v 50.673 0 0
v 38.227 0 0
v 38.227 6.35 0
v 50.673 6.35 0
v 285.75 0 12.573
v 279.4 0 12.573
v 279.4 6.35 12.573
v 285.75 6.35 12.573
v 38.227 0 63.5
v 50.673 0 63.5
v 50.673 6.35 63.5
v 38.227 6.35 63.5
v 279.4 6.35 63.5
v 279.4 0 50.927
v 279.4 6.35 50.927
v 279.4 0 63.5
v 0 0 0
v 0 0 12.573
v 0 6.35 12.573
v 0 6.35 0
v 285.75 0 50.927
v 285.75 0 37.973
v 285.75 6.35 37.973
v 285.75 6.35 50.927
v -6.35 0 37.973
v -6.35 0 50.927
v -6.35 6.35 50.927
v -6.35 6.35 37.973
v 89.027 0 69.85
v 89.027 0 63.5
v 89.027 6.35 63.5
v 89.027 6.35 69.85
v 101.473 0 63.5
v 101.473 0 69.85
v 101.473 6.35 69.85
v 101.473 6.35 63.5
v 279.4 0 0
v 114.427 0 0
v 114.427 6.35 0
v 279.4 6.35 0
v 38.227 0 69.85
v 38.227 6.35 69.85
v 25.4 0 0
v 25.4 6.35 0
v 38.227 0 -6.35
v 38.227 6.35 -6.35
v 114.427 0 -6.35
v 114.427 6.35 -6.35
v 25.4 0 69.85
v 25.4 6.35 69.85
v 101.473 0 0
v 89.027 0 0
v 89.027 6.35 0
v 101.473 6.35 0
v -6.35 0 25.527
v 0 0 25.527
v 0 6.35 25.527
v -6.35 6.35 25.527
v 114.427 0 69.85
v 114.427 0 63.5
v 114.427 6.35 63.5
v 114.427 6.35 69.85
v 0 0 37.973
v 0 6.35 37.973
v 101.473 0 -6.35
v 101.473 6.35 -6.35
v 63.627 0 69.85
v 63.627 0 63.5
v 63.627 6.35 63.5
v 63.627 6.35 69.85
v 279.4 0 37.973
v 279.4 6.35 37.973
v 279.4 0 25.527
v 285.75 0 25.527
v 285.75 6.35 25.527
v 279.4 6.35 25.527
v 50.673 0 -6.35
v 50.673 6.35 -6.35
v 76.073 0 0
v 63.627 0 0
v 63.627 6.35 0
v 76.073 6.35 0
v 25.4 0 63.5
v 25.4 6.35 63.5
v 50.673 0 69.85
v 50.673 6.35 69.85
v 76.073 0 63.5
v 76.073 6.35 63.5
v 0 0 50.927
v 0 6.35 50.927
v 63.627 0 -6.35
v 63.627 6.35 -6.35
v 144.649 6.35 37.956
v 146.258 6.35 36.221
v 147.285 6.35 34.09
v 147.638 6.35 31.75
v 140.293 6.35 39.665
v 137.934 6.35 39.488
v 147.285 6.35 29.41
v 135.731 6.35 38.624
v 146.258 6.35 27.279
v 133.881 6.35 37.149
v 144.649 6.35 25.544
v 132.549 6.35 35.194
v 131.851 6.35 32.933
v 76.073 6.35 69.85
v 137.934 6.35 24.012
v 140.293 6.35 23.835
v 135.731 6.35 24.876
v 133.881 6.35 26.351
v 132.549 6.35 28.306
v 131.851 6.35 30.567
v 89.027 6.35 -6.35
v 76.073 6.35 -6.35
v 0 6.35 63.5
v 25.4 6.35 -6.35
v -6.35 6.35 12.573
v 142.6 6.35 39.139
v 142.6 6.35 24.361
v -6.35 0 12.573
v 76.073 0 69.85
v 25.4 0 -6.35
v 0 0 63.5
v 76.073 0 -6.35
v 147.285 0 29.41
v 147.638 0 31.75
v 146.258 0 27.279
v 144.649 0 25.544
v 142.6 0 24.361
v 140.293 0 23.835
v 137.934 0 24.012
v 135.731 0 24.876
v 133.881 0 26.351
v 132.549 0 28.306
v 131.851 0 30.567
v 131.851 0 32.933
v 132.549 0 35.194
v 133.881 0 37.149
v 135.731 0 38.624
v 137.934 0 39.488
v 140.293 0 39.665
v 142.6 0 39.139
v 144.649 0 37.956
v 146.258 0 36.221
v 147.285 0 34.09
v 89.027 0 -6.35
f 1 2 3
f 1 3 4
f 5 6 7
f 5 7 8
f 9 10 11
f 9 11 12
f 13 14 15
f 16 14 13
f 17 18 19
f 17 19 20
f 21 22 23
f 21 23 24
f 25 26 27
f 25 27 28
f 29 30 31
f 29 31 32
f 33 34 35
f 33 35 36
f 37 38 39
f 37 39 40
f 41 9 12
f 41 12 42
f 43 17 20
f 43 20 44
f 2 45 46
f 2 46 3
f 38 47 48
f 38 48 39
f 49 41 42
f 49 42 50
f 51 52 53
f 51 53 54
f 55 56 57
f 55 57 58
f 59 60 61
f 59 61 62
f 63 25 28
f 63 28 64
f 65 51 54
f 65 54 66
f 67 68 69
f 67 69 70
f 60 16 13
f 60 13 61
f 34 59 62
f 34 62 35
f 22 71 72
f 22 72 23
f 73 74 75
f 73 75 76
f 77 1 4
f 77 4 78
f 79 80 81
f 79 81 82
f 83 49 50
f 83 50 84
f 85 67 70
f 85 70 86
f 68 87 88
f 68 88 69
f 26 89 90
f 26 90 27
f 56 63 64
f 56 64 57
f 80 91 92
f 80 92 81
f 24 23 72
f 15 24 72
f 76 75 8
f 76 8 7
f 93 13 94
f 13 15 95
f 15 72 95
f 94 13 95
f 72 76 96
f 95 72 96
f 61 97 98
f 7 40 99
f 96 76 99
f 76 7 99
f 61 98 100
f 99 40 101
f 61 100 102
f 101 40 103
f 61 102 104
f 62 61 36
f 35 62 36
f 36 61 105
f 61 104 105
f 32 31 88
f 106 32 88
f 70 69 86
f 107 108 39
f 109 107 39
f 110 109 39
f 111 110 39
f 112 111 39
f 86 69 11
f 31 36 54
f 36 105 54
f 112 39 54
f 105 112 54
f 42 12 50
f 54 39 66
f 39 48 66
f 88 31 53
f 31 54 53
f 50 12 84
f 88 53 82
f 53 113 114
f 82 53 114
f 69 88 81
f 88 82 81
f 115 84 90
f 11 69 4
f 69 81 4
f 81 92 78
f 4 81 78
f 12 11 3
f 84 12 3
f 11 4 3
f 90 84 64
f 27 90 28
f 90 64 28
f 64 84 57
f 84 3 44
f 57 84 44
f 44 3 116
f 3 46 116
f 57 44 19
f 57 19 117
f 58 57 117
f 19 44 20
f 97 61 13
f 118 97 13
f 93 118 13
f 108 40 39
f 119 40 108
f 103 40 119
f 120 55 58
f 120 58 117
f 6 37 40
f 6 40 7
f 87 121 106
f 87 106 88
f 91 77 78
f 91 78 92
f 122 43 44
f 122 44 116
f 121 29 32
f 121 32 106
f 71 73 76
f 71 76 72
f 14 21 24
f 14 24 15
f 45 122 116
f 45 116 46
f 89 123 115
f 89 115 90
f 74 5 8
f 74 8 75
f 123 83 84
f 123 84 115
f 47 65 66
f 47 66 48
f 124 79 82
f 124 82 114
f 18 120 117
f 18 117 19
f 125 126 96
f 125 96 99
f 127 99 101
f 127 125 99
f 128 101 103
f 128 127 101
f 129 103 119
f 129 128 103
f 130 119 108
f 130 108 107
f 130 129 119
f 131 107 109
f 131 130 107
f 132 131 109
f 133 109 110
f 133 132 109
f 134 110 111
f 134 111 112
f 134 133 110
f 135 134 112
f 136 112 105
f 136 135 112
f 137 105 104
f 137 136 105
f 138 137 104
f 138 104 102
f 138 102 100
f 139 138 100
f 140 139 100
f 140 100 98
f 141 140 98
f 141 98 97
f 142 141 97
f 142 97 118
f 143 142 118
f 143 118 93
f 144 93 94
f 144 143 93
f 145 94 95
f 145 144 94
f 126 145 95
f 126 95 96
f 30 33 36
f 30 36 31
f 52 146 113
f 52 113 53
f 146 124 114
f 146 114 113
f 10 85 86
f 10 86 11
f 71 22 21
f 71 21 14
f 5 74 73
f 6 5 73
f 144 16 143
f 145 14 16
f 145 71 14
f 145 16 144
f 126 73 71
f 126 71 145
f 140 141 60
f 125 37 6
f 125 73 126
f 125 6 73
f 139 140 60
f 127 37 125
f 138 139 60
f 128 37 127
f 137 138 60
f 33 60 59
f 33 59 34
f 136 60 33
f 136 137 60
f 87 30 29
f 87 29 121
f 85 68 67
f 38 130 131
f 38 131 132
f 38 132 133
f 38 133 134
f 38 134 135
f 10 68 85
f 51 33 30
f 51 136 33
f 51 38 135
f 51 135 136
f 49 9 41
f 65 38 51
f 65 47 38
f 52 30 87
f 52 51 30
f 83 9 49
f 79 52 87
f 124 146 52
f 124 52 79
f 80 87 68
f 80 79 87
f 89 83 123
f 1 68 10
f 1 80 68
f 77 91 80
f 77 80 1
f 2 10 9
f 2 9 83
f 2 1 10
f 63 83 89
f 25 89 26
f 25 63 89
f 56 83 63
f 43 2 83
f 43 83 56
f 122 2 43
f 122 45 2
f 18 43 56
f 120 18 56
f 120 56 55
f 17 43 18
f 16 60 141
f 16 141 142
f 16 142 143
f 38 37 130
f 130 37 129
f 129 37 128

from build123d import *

# Parameters (mm, degrees)
SKETCH1_R           = 7.9375
BOSS_EXTRUDE1_DEPTH = 6.35


with BuildPart() as part:
    # Sketch1 → Boss-Extrude1 (new body)
    with BuildSketch(Plane(origin=(0, 0, 0), x_dir=(1, 0, 0), z_dir=(0, 1, 0))):
        Polygon((279.4, 0), (279.4, -12.573), (285.75, -12.573), (285.75, -25.527), (279.4, -25.527), (279.4, -37.973), (285.75, -37.973), (285.75, -50.927), (279.4, -50.927), (279.4, -63.5), (114.427, -63.5), (114.427, -69.85), (101.473, -69.85), (101.473, -63.5), (89.027, -63.5), (89.027, -69.85), (76.073, -69.85), (76.073, -63.5), (63.627, -63.5), (63.627, -69.85), (50.673, -69.85), (50.673, -63.5), (38.227, -63.5), (38.227, -69.85), (25.4, -69.85), (25.4, -63.5), (0, -63.5), (0, -50.927), (-6.35, -50.927), (-6.35, -37.973), (0, -37.973), (0, -25.527), (-6.35, -25.527), (-6.35, -12.573), (0, -12.573), (0, 0), (25.4, 0), (25.4, 6.35), (38.227, 6.35), (38.227, 0), (50.673, 0), (50.673, 6.35), (63.627, 6.35), (63.627, 0), (76.073, 0), (76.073, 6.35), (89.027, 6.35), (89.027, 0), (101.473, 0), (101.473, 6.35), (114.427, 6.35), (114.427, 0), align=None)
        with Locations((139.7, -31.75)):
            Circle(SKETCH1_R, mode=Mode.SUBTRACT)
    extrude(amount=BOSS_EXTRUDE1_DEPTH)


solid = part.part
